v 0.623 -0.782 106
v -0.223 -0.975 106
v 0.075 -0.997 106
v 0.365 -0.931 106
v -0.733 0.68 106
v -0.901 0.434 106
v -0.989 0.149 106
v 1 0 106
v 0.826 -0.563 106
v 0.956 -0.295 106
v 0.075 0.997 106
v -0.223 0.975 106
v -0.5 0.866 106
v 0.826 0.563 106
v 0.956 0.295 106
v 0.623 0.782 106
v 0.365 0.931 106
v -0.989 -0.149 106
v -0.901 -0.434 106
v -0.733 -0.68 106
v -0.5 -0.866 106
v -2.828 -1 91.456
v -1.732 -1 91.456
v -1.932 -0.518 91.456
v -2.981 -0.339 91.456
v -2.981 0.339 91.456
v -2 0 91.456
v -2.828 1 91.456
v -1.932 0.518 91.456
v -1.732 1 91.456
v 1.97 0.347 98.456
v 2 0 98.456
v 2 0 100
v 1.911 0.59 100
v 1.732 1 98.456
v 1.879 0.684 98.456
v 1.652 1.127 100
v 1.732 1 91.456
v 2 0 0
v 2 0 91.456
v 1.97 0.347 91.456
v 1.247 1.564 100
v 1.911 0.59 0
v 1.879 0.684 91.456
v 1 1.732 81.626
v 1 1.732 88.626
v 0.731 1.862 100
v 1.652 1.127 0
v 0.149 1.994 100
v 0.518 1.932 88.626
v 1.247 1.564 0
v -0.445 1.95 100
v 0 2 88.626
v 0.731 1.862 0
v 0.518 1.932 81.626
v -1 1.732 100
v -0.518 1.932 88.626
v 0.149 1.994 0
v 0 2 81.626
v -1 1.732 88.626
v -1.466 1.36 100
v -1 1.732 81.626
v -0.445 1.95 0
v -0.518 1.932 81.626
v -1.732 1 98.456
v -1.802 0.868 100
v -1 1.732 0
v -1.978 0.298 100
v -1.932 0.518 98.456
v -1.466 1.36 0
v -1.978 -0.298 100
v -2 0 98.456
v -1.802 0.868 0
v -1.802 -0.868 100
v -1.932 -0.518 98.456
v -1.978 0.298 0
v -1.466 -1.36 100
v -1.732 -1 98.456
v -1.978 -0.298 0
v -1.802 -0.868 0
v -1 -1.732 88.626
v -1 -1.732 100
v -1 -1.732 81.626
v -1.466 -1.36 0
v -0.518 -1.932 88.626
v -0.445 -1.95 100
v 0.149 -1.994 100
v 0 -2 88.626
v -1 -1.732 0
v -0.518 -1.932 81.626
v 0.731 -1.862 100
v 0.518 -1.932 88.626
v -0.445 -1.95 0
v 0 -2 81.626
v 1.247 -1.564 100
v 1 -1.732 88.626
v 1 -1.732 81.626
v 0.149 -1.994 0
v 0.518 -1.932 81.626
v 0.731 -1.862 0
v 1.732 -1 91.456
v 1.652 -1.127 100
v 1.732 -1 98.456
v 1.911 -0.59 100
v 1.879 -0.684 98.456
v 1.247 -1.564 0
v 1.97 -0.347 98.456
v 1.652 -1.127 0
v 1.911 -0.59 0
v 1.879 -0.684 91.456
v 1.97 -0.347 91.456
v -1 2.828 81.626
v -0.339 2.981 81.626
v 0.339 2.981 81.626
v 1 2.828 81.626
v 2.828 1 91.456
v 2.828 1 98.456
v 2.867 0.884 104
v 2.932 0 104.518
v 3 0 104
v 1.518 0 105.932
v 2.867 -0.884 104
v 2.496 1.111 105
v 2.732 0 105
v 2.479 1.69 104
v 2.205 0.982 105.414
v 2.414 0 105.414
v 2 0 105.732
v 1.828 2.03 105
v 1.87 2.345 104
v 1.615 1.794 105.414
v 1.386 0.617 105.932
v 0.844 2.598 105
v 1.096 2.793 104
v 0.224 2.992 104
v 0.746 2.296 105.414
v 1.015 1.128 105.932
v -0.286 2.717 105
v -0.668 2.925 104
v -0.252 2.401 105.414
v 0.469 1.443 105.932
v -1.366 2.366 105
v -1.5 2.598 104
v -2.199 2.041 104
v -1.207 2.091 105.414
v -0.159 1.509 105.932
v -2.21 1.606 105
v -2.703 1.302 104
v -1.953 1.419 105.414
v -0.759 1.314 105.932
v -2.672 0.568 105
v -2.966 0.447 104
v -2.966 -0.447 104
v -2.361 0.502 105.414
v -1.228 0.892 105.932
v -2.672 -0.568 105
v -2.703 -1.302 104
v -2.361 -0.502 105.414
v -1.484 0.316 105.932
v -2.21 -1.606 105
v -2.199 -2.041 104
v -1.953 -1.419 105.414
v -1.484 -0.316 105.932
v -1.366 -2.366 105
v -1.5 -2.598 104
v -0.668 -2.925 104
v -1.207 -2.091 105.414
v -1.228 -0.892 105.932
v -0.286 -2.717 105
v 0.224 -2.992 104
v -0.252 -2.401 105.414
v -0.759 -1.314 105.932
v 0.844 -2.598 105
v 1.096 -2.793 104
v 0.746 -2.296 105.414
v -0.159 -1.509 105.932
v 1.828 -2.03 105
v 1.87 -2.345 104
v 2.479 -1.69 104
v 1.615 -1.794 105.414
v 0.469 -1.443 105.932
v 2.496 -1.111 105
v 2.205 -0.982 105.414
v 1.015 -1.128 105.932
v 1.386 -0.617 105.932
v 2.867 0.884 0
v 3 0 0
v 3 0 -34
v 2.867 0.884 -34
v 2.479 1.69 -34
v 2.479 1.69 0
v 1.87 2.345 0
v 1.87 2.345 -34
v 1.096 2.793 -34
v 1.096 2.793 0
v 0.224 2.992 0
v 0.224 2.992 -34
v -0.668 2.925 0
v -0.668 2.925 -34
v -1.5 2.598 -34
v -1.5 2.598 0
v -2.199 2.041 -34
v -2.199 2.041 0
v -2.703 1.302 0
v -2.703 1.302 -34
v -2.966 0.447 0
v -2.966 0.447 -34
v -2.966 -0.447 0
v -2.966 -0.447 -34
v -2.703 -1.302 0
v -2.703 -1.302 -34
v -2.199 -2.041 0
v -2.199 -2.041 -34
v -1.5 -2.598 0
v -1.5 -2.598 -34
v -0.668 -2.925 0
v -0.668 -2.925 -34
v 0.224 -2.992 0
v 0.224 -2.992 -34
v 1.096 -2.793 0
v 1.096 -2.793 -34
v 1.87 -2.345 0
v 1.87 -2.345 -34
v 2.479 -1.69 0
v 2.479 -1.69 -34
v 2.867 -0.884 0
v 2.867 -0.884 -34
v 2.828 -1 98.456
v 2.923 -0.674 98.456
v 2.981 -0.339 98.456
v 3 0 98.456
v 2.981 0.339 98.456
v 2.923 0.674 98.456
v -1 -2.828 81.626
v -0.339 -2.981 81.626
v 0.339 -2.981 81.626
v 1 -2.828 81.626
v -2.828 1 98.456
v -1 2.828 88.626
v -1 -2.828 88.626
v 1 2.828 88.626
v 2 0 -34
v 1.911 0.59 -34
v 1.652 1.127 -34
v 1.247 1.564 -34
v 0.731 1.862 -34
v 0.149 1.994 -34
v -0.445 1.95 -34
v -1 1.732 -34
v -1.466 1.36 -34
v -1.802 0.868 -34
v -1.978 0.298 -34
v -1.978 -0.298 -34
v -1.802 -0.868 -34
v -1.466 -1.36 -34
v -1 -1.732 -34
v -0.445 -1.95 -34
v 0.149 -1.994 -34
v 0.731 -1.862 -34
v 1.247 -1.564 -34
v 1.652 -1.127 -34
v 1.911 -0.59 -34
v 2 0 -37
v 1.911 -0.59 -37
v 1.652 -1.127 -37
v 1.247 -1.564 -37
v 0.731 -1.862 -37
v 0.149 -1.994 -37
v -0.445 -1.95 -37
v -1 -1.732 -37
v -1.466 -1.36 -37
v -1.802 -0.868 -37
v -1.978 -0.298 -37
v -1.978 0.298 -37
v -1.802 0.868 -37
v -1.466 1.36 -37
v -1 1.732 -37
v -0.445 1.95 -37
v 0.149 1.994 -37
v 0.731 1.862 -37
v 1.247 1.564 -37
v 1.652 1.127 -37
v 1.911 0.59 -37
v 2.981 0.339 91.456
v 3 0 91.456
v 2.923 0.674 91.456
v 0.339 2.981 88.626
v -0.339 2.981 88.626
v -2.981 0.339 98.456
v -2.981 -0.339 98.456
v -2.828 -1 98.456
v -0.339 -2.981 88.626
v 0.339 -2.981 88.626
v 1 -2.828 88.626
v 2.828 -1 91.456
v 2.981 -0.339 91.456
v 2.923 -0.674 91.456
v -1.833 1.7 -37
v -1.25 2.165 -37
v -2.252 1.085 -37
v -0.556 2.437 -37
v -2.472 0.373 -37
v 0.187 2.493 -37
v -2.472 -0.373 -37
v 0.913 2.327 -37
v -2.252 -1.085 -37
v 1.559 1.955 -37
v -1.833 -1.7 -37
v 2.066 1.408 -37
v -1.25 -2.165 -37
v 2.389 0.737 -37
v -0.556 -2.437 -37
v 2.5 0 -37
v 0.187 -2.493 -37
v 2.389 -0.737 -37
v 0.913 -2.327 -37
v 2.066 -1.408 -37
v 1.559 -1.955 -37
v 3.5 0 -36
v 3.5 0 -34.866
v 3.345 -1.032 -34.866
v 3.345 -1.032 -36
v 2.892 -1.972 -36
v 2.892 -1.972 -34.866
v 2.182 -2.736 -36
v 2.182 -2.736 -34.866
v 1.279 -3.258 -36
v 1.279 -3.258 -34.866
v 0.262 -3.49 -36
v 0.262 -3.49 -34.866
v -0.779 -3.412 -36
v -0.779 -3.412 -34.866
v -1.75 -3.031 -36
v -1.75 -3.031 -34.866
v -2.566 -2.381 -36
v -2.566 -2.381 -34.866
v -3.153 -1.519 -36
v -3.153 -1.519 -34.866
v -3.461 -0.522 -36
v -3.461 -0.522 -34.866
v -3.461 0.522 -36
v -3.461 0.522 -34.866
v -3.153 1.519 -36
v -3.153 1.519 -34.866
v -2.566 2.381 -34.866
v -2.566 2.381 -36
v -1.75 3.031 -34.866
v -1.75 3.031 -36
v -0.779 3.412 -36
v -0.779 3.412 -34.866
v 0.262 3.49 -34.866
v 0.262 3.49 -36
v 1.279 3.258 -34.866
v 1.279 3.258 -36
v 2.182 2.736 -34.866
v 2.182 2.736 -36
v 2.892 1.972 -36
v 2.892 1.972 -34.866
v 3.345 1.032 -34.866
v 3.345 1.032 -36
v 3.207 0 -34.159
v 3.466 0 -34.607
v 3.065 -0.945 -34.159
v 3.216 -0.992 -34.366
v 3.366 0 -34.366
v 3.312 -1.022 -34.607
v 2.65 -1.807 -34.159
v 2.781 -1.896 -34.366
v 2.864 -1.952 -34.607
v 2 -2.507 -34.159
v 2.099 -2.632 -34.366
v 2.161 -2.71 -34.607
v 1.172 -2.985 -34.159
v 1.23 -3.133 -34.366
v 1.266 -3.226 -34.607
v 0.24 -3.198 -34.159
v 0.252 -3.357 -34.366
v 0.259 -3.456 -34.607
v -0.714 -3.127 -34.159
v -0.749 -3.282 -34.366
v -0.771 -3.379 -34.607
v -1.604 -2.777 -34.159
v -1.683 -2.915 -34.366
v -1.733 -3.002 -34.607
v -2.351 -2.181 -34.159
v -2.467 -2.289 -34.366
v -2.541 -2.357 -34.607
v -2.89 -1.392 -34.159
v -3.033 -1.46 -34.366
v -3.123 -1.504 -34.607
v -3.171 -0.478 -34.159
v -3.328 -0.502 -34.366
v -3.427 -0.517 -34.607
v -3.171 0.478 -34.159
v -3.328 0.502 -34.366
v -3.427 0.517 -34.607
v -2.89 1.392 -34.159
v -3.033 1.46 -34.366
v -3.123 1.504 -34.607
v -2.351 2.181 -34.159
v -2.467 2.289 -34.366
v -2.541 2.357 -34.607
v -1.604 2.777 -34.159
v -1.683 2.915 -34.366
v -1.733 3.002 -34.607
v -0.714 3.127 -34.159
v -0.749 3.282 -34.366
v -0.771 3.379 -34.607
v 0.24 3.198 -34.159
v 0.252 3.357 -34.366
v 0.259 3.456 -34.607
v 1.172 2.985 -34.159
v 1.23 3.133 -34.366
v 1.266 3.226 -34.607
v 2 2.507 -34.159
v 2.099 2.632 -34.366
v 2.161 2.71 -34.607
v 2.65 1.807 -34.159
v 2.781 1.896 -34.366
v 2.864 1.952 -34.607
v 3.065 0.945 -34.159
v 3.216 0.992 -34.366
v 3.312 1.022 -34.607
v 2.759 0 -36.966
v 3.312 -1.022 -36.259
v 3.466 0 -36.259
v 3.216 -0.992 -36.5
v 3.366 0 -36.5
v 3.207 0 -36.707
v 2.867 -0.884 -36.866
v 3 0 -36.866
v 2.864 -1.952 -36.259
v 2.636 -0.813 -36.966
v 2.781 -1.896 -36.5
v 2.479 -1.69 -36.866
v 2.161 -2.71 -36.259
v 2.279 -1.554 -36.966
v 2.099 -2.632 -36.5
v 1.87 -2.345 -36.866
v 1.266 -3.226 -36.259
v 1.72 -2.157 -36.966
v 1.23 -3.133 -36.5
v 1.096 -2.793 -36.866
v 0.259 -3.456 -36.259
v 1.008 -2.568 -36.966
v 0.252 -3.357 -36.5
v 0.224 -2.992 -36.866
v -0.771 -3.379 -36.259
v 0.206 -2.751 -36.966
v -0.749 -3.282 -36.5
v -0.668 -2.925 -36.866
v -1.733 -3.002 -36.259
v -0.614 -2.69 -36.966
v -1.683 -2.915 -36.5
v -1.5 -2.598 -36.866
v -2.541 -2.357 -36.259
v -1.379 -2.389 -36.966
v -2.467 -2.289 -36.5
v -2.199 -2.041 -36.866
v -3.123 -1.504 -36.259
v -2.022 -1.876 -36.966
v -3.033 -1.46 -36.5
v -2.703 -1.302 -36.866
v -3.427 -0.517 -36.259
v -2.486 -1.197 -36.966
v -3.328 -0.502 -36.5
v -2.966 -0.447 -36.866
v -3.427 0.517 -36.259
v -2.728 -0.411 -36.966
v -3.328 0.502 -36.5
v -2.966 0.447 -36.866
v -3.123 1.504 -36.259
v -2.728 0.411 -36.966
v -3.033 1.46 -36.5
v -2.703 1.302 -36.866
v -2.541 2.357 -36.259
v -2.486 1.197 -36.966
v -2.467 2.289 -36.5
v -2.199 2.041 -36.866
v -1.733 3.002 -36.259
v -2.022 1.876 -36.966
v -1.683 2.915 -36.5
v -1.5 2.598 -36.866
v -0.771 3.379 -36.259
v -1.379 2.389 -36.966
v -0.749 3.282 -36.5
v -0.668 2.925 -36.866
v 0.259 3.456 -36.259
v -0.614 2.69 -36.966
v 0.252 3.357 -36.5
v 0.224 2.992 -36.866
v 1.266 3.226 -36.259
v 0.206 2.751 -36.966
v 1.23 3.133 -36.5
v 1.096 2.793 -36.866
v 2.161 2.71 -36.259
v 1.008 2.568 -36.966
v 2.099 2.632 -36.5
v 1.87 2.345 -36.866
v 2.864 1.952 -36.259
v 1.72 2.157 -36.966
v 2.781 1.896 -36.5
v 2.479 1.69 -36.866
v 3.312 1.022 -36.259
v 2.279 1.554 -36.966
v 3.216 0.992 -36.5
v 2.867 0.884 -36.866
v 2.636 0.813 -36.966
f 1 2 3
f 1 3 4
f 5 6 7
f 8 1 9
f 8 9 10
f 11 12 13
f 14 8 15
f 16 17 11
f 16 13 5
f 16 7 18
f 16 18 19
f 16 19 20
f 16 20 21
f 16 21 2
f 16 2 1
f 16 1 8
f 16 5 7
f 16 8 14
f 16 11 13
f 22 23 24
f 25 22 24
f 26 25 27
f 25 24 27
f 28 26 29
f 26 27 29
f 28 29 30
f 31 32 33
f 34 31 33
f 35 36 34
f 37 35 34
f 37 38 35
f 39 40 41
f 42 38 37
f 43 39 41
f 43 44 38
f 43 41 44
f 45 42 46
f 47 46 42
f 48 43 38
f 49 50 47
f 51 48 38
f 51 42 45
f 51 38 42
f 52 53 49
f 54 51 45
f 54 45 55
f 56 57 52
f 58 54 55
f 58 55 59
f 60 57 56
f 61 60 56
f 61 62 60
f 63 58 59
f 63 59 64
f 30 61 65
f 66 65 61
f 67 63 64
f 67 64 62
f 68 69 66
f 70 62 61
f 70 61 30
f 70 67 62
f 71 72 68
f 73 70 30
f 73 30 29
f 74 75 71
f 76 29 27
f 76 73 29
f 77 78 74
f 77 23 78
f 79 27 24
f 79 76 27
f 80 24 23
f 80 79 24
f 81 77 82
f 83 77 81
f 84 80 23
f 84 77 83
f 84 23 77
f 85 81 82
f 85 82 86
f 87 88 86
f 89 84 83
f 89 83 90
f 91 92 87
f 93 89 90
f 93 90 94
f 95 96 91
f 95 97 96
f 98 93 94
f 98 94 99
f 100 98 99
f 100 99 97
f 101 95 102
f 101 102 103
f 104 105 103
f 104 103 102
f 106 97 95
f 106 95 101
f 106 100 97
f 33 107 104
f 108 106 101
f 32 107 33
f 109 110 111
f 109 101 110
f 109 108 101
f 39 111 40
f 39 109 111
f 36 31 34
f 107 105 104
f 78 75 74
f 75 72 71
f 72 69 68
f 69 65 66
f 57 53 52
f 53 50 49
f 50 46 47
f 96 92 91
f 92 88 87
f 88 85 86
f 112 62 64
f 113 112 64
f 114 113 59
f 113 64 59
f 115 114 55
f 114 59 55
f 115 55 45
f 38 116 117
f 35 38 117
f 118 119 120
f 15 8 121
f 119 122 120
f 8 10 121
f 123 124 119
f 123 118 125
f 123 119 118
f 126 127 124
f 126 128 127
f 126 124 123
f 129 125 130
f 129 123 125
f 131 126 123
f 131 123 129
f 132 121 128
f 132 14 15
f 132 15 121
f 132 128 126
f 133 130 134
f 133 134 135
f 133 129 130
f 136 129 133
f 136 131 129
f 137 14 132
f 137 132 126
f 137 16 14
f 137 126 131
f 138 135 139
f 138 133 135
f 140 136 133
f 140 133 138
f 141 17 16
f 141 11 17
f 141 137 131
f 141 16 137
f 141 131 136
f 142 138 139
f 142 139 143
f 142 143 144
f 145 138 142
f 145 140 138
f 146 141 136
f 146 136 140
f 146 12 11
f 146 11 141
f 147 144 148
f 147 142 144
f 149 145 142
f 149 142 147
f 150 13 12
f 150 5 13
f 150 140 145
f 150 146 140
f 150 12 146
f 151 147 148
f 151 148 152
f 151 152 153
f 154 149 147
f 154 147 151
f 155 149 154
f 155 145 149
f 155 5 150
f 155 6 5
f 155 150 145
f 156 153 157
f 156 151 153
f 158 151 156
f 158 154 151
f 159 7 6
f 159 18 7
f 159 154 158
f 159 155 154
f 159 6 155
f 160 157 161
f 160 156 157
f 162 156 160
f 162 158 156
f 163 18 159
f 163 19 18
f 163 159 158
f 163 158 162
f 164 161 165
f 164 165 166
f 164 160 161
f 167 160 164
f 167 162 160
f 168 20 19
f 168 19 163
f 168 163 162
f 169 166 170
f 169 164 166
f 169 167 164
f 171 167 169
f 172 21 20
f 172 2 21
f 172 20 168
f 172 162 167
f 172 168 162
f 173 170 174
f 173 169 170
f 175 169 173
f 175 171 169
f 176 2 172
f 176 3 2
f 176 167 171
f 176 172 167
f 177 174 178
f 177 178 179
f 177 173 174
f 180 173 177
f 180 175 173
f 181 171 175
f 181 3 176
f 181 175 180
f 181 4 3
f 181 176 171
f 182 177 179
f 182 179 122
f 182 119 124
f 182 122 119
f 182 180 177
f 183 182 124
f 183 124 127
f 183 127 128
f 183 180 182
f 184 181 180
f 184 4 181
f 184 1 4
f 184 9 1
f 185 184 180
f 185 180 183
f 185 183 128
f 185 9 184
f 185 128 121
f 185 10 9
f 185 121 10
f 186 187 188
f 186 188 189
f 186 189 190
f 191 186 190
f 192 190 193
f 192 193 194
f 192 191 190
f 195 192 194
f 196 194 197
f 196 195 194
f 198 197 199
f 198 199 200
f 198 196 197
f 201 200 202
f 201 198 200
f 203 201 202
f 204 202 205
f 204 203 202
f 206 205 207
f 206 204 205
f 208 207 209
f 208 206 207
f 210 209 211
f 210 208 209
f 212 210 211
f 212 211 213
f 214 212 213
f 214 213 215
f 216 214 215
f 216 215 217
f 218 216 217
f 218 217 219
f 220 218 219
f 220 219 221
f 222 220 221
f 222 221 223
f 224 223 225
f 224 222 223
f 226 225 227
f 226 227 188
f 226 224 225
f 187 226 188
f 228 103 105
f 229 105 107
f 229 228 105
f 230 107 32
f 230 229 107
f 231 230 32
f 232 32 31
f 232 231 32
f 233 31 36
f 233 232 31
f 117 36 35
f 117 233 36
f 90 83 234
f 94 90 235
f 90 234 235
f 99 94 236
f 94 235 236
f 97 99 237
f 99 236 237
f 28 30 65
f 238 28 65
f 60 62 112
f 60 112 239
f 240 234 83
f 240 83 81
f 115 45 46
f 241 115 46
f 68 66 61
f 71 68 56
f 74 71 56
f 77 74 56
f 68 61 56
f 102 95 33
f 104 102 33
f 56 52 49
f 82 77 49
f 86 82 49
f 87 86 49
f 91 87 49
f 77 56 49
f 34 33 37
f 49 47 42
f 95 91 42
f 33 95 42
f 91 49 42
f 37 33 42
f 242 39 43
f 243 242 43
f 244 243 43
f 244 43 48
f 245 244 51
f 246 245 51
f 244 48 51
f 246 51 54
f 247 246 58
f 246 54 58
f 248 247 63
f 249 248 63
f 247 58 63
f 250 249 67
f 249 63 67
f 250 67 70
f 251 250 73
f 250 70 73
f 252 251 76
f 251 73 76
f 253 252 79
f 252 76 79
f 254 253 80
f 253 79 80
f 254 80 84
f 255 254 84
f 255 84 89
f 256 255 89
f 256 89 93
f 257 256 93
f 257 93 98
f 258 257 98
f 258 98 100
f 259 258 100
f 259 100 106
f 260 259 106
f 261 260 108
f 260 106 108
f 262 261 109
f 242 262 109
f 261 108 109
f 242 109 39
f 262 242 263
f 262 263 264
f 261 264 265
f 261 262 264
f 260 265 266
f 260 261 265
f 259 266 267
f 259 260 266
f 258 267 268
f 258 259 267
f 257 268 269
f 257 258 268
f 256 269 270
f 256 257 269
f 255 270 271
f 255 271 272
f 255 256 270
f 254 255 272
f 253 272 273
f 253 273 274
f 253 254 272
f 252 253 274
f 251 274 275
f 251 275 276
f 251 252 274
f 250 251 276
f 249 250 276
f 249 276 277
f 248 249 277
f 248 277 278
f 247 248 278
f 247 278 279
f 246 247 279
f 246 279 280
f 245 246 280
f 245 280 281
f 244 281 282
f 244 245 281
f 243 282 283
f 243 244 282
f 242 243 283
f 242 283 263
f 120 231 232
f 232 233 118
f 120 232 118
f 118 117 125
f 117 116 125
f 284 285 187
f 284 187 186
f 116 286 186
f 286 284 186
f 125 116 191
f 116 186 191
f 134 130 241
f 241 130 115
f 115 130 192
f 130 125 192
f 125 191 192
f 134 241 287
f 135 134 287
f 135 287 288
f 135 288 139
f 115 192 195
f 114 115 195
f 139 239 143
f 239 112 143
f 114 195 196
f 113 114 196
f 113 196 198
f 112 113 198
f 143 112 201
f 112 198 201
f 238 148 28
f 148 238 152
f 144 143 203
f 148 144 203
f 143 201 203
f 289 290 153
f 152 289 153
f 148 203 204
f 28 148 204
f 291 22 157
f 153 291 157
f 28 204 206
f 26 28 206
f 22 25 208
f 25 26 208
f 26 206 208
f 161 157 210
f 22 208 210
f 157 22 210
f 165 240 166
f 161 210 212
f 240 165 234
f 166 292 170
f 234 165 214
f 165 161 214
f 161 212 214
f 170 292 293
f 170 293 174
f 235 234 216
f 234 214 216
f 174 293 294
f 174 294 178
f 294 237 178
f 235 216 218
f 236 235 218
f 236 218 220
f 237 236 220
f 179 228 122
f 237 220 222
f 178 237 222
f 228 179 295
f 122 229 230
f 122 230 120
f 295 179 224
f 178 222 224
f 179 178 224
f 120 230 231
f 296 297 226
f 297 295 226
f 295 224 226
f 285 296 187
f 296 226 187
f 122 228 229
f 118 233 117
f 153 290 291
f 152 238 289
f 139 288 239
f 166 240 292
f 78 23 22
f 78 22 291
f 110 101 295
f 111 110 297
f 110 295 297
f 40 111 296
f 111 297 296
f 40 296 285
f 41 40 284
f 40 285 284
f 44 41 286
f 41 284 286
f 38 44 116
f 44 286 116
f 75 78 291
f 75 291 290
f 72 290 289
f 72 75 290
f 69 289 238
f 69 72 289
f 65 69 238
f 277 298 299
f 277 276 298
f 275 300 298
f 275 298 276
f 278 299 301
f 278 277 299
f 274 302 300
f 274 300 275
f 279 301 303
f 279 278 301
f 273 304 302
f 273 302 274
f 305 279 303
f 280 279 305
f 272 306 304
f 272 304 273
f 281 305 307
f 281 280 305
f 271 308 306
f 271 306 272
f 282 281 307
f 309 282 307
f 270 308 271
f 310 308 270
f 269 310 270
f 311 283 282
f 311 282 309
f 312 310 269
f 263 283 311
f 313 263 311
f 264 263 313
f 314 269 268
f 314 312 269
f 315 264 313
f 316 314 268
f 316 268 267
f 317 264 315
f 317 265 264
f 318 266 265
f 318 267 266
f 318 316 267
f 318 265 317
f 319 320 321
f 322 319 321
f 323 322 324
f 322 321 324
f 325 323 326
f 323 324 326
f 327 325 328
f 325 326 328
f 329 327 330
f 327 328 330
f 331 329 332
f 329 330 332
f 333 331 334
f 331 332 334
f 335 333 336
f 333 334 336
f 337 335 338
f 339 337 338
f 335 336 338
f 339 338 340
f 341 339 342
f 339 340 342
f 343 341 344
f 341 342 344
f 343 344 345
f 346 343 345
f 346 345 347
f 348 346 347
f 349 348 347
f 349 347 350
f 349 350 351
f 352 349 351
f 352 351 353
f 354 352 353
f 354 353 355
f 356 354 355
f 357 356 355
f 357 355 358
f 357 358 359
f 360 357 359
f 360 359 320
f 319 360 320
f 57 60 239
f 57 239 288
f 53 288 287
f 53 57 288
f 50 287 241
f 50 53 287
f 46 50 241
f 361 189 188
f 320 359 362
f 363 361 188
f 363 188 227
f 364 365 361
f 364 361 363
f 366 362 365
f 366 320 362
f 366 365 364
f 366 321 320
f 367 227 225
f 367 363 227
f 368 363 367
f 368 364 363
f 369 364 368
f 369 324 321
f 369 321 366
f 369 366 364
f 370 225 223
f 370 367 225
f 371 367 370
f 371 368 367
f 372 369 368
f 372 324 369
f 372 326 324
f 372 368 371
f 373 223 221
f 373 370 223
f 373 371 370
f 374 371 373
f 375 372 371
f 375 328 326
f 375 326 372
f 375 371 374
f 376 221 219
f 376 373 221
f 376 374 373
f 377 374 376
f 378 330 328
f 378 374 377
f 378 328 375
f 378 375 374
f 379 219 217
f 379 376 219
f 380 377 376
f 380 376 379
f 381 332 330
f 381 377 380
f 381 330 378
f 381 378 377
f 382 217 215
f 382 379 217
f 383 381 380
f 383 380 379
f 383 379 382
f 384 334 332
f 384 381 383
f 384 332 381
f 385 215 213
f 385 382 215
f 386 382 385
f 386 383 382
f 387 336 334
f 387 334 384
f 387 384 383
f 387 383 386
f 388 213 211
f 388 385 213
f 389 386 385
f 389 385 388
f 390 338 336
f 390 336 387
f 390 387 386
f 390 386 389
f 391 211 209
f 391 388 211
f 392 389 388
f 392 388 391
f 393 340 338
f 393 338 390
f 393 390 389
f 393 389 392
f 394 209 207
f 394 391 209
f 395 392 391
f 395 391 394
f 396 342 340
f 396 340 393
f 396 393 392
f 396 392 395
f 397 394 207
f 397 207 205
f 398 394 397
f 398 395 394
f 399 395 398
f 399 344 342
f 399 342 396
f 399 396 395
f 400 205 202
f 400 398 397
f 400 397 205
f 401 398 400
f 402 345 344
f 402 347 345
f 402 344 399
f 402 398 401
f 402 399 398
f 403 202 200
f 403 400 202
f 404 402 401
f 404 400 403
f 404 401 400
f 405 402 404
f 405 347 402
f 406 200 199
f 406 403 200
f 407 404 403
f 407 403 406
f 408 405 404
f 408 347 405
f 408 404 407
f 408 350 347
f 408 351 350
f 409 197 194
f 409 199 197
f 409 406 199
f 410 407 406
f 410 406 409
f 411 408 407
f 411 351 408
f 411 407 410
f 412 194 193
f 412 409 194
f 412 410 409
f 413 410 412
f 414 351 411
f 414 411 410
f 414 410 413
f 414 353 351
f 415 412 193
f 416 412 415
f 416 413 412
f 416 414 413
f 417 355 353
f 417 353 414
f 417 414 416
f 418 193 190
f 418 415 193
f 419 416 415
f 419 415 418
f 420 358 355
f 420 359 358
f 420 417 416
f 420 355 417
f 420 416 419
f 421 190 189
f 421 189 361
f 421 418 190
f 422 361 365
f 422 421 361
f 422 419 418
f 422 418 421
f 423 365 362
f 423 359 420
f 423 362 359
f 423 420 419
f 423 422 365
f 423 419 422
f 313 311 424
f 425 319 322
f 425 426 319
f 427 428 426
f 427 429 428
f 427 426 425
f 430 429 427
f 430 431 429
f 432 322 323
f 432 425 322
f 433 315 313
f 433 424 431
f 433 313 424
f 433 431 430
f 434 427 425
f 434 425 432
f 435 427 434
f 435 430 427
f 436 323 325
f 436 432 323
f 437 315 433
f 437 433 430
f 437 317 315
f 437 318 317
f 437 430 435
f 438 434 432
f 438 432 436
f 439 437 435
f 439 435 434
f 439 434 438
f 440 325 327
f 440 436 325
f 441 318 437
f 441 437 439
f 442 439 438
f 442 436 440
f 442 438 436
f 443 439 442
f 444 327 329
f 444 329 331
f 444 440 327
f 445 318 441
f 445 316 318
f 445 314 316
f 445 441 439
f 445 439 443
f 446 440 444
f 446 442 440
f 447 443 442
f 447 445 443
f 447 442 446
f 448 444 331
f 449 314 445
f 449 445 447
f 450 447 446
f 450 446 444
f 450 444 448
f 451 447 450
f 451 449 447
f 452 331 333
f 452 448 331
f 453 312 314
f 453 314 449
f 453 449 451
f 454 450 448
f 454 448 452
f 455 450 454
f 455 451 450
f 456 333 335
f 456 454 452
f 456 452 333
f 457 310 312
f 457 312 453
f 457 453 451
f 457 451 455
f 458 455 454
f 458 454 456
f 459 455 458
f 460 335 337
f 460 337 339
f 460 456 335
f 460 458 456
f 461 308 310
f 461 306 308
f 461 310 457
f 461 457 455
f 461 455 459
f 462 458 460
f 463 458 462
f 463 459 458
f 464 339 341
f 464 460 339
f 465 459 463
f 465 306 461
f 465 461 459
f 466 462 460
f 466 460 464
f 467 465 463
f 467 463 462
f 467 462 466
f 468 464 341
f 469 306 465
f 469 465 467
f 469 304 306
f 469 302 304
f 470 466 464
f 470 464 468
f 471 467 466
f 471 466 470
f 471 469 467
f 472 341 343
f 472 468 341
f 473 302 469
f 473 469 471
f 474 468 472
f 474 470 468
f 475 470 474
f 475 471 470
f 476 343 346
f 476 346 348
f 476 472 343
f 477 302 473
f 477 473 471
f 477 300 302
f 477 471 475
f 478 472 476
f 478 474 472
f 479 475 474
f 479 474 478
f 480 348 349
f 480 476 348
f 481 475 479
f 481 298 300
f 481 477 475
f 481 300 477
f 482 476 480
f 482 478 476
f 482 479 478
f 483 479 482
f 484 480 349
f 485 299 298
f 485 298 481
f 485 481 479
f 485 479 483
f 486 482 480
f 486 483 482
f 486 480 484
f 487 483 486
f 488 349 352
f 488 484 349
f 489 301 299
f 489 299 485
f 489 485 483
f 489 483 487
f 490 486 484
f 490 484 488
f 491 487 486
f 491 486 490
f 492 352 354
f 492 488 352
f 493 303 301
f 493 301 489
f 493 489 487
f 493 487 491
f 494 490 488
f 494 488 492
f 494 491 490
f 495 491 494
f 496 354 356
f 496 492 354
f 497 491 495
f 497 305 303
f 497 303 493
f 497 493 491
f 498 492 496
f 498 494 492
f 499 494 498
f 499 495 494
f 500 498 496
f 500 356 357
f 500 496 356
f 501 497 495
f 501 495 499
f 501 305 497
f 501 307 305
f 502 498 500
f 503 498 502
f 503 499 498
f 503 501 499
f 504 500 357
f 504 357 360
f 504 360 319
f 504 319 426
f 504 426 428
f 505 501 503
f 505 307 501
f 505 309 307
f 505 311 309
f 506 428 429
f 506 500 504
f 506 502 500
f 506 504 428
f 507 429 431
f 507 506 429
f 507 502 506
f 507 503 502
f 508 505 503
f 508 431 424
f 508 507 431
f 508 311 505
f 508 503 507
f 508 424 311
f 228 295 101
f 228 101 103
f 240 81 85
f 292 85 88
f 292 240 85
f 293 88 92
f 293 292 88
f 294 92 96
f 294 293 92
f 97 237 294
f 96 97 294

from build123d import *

# Parameters (mm, degrees)
F0_R      = 3
F0_R_2    = 2
F1_DEPTH  = 100
F2_R      = 3
F2_R_2    = 2
F3_DEPTH  = 6
F4_W      = 2
F4_H      = 7
F6_DEPTH  = 12.5
F5_W      = 2
F5_H      = 7
F7_DEPTH  = 12.5
F8_R      = 2
F9_DEPTH  = 34
F10_R     = 3.5
F10_R_2   = 3
F10_R_3   = 2
F11_DEPTH = 3


# Not quite as in the source:
# - a fillet or chamfer that OpenCascade refuses, or shapes differently, is made with other operations: its cross-section is extruded or revolved along the edge and cut away or added


with BuildPart() as f1:
    # F0 (on Top) → F1 (new body)
    with BuildSketch(Plane.XY):
        Circle(F0_R)
        Circle(F0_R_2, mode=Mode.SUBTRACT)
    extrude(amount=F1_DEPTH)

    # F2 (on face) → F3 (join)
    with BuildSketch(Plane.XY.offset(100)):
        Circle(F2_R)
        Circle(F2_R_2, mode=Mode.SUBTRACT)
        Circle(F2_R_2)
    extrude(amount=F3_DEPTH)

    # F4 (on Front) → F6 (cut, symmetric)
    with BuildSketch(Plane.XZ):
        with Locations((0, 85.1259604096)):
            Rectangle(F4_W, F4_H)
    extrude(amount=F6_DEPTH, both=True, mode=Mode.SUBTRACT)

    # F5 (on Right) → F7 (cut, symmetric)
    with BuildSketch(Plane.YZ):
        with Locations((0, 94.9563682079)):
            Rectangle(F5_W, F5_H)
    extrude(amount=F7_DEPTH, both=True, mode=Mode.SUBTRACT)

    # F8
    f8_edges = [f1.edges().sort_by_distance(p)[0] for p in [
        (-3, 0, 106),
    ]]
    fillet(f8_edges, radius=F8_R)

    # F9 (add): a face of the model
    f9_faces = [f1.faces().sort_by_distance(p)[0] for p in [
        (-2.9151471863, 0, 0),
    ]]
    extrude(f9_faces, amount=F9_DEPTH)

    # F10 (on face) → F11 (join)
    with BuildSketch(Plane(origin=(0, 0, -34), x_dir=(1, 0, 0), z_dir=(0, 0, -1))):
        Circle(F10_R)
        Circle(F10_R_2, mode=Mode.SUBTRACT)
        Circle(F10_R_2)
        Circle(F10_R_3, mode=Mode.SUBTRACT)
    extrude(amount=F11_DEPTH)

    # F12: fillet of radius 1 on 2 edges, made by hand

    # F12_s1 → F12_t2 (revolve, cut)
    with BuildSketch(Plane.XZ):
        with BuildLine():
            ThreePointArc((3, -34), (3.3660254038, -34.3660254038), (3.5, -34.8660254038))
            Line((3.5, -34.8660254038), (3.5, -34))
            Line((3.5, -34), (3, -34))
        make_face()
    revolve(axis=Axis((0, 0, -34), (0, 0, -1)), mode=Mode.SUBTRACT)

    # F12_s3 → F12_t4 (revolve, cut)
    with BuildSketch(Plane.XZ):
        with BuildLine():
            ThreePointArc((3.5, -36), (3.2071067812, -36.7071067812), (2.5, -37))
            Line((2.5, -37), (3.5, -37))
            Line((3.5, -37), (3.5, -36))
        make_face()
    revolve(axis=Axis((0, 0, -37), (0, 0, -1)), mode=Mode.SUBTRACT)


solid = f1.part
